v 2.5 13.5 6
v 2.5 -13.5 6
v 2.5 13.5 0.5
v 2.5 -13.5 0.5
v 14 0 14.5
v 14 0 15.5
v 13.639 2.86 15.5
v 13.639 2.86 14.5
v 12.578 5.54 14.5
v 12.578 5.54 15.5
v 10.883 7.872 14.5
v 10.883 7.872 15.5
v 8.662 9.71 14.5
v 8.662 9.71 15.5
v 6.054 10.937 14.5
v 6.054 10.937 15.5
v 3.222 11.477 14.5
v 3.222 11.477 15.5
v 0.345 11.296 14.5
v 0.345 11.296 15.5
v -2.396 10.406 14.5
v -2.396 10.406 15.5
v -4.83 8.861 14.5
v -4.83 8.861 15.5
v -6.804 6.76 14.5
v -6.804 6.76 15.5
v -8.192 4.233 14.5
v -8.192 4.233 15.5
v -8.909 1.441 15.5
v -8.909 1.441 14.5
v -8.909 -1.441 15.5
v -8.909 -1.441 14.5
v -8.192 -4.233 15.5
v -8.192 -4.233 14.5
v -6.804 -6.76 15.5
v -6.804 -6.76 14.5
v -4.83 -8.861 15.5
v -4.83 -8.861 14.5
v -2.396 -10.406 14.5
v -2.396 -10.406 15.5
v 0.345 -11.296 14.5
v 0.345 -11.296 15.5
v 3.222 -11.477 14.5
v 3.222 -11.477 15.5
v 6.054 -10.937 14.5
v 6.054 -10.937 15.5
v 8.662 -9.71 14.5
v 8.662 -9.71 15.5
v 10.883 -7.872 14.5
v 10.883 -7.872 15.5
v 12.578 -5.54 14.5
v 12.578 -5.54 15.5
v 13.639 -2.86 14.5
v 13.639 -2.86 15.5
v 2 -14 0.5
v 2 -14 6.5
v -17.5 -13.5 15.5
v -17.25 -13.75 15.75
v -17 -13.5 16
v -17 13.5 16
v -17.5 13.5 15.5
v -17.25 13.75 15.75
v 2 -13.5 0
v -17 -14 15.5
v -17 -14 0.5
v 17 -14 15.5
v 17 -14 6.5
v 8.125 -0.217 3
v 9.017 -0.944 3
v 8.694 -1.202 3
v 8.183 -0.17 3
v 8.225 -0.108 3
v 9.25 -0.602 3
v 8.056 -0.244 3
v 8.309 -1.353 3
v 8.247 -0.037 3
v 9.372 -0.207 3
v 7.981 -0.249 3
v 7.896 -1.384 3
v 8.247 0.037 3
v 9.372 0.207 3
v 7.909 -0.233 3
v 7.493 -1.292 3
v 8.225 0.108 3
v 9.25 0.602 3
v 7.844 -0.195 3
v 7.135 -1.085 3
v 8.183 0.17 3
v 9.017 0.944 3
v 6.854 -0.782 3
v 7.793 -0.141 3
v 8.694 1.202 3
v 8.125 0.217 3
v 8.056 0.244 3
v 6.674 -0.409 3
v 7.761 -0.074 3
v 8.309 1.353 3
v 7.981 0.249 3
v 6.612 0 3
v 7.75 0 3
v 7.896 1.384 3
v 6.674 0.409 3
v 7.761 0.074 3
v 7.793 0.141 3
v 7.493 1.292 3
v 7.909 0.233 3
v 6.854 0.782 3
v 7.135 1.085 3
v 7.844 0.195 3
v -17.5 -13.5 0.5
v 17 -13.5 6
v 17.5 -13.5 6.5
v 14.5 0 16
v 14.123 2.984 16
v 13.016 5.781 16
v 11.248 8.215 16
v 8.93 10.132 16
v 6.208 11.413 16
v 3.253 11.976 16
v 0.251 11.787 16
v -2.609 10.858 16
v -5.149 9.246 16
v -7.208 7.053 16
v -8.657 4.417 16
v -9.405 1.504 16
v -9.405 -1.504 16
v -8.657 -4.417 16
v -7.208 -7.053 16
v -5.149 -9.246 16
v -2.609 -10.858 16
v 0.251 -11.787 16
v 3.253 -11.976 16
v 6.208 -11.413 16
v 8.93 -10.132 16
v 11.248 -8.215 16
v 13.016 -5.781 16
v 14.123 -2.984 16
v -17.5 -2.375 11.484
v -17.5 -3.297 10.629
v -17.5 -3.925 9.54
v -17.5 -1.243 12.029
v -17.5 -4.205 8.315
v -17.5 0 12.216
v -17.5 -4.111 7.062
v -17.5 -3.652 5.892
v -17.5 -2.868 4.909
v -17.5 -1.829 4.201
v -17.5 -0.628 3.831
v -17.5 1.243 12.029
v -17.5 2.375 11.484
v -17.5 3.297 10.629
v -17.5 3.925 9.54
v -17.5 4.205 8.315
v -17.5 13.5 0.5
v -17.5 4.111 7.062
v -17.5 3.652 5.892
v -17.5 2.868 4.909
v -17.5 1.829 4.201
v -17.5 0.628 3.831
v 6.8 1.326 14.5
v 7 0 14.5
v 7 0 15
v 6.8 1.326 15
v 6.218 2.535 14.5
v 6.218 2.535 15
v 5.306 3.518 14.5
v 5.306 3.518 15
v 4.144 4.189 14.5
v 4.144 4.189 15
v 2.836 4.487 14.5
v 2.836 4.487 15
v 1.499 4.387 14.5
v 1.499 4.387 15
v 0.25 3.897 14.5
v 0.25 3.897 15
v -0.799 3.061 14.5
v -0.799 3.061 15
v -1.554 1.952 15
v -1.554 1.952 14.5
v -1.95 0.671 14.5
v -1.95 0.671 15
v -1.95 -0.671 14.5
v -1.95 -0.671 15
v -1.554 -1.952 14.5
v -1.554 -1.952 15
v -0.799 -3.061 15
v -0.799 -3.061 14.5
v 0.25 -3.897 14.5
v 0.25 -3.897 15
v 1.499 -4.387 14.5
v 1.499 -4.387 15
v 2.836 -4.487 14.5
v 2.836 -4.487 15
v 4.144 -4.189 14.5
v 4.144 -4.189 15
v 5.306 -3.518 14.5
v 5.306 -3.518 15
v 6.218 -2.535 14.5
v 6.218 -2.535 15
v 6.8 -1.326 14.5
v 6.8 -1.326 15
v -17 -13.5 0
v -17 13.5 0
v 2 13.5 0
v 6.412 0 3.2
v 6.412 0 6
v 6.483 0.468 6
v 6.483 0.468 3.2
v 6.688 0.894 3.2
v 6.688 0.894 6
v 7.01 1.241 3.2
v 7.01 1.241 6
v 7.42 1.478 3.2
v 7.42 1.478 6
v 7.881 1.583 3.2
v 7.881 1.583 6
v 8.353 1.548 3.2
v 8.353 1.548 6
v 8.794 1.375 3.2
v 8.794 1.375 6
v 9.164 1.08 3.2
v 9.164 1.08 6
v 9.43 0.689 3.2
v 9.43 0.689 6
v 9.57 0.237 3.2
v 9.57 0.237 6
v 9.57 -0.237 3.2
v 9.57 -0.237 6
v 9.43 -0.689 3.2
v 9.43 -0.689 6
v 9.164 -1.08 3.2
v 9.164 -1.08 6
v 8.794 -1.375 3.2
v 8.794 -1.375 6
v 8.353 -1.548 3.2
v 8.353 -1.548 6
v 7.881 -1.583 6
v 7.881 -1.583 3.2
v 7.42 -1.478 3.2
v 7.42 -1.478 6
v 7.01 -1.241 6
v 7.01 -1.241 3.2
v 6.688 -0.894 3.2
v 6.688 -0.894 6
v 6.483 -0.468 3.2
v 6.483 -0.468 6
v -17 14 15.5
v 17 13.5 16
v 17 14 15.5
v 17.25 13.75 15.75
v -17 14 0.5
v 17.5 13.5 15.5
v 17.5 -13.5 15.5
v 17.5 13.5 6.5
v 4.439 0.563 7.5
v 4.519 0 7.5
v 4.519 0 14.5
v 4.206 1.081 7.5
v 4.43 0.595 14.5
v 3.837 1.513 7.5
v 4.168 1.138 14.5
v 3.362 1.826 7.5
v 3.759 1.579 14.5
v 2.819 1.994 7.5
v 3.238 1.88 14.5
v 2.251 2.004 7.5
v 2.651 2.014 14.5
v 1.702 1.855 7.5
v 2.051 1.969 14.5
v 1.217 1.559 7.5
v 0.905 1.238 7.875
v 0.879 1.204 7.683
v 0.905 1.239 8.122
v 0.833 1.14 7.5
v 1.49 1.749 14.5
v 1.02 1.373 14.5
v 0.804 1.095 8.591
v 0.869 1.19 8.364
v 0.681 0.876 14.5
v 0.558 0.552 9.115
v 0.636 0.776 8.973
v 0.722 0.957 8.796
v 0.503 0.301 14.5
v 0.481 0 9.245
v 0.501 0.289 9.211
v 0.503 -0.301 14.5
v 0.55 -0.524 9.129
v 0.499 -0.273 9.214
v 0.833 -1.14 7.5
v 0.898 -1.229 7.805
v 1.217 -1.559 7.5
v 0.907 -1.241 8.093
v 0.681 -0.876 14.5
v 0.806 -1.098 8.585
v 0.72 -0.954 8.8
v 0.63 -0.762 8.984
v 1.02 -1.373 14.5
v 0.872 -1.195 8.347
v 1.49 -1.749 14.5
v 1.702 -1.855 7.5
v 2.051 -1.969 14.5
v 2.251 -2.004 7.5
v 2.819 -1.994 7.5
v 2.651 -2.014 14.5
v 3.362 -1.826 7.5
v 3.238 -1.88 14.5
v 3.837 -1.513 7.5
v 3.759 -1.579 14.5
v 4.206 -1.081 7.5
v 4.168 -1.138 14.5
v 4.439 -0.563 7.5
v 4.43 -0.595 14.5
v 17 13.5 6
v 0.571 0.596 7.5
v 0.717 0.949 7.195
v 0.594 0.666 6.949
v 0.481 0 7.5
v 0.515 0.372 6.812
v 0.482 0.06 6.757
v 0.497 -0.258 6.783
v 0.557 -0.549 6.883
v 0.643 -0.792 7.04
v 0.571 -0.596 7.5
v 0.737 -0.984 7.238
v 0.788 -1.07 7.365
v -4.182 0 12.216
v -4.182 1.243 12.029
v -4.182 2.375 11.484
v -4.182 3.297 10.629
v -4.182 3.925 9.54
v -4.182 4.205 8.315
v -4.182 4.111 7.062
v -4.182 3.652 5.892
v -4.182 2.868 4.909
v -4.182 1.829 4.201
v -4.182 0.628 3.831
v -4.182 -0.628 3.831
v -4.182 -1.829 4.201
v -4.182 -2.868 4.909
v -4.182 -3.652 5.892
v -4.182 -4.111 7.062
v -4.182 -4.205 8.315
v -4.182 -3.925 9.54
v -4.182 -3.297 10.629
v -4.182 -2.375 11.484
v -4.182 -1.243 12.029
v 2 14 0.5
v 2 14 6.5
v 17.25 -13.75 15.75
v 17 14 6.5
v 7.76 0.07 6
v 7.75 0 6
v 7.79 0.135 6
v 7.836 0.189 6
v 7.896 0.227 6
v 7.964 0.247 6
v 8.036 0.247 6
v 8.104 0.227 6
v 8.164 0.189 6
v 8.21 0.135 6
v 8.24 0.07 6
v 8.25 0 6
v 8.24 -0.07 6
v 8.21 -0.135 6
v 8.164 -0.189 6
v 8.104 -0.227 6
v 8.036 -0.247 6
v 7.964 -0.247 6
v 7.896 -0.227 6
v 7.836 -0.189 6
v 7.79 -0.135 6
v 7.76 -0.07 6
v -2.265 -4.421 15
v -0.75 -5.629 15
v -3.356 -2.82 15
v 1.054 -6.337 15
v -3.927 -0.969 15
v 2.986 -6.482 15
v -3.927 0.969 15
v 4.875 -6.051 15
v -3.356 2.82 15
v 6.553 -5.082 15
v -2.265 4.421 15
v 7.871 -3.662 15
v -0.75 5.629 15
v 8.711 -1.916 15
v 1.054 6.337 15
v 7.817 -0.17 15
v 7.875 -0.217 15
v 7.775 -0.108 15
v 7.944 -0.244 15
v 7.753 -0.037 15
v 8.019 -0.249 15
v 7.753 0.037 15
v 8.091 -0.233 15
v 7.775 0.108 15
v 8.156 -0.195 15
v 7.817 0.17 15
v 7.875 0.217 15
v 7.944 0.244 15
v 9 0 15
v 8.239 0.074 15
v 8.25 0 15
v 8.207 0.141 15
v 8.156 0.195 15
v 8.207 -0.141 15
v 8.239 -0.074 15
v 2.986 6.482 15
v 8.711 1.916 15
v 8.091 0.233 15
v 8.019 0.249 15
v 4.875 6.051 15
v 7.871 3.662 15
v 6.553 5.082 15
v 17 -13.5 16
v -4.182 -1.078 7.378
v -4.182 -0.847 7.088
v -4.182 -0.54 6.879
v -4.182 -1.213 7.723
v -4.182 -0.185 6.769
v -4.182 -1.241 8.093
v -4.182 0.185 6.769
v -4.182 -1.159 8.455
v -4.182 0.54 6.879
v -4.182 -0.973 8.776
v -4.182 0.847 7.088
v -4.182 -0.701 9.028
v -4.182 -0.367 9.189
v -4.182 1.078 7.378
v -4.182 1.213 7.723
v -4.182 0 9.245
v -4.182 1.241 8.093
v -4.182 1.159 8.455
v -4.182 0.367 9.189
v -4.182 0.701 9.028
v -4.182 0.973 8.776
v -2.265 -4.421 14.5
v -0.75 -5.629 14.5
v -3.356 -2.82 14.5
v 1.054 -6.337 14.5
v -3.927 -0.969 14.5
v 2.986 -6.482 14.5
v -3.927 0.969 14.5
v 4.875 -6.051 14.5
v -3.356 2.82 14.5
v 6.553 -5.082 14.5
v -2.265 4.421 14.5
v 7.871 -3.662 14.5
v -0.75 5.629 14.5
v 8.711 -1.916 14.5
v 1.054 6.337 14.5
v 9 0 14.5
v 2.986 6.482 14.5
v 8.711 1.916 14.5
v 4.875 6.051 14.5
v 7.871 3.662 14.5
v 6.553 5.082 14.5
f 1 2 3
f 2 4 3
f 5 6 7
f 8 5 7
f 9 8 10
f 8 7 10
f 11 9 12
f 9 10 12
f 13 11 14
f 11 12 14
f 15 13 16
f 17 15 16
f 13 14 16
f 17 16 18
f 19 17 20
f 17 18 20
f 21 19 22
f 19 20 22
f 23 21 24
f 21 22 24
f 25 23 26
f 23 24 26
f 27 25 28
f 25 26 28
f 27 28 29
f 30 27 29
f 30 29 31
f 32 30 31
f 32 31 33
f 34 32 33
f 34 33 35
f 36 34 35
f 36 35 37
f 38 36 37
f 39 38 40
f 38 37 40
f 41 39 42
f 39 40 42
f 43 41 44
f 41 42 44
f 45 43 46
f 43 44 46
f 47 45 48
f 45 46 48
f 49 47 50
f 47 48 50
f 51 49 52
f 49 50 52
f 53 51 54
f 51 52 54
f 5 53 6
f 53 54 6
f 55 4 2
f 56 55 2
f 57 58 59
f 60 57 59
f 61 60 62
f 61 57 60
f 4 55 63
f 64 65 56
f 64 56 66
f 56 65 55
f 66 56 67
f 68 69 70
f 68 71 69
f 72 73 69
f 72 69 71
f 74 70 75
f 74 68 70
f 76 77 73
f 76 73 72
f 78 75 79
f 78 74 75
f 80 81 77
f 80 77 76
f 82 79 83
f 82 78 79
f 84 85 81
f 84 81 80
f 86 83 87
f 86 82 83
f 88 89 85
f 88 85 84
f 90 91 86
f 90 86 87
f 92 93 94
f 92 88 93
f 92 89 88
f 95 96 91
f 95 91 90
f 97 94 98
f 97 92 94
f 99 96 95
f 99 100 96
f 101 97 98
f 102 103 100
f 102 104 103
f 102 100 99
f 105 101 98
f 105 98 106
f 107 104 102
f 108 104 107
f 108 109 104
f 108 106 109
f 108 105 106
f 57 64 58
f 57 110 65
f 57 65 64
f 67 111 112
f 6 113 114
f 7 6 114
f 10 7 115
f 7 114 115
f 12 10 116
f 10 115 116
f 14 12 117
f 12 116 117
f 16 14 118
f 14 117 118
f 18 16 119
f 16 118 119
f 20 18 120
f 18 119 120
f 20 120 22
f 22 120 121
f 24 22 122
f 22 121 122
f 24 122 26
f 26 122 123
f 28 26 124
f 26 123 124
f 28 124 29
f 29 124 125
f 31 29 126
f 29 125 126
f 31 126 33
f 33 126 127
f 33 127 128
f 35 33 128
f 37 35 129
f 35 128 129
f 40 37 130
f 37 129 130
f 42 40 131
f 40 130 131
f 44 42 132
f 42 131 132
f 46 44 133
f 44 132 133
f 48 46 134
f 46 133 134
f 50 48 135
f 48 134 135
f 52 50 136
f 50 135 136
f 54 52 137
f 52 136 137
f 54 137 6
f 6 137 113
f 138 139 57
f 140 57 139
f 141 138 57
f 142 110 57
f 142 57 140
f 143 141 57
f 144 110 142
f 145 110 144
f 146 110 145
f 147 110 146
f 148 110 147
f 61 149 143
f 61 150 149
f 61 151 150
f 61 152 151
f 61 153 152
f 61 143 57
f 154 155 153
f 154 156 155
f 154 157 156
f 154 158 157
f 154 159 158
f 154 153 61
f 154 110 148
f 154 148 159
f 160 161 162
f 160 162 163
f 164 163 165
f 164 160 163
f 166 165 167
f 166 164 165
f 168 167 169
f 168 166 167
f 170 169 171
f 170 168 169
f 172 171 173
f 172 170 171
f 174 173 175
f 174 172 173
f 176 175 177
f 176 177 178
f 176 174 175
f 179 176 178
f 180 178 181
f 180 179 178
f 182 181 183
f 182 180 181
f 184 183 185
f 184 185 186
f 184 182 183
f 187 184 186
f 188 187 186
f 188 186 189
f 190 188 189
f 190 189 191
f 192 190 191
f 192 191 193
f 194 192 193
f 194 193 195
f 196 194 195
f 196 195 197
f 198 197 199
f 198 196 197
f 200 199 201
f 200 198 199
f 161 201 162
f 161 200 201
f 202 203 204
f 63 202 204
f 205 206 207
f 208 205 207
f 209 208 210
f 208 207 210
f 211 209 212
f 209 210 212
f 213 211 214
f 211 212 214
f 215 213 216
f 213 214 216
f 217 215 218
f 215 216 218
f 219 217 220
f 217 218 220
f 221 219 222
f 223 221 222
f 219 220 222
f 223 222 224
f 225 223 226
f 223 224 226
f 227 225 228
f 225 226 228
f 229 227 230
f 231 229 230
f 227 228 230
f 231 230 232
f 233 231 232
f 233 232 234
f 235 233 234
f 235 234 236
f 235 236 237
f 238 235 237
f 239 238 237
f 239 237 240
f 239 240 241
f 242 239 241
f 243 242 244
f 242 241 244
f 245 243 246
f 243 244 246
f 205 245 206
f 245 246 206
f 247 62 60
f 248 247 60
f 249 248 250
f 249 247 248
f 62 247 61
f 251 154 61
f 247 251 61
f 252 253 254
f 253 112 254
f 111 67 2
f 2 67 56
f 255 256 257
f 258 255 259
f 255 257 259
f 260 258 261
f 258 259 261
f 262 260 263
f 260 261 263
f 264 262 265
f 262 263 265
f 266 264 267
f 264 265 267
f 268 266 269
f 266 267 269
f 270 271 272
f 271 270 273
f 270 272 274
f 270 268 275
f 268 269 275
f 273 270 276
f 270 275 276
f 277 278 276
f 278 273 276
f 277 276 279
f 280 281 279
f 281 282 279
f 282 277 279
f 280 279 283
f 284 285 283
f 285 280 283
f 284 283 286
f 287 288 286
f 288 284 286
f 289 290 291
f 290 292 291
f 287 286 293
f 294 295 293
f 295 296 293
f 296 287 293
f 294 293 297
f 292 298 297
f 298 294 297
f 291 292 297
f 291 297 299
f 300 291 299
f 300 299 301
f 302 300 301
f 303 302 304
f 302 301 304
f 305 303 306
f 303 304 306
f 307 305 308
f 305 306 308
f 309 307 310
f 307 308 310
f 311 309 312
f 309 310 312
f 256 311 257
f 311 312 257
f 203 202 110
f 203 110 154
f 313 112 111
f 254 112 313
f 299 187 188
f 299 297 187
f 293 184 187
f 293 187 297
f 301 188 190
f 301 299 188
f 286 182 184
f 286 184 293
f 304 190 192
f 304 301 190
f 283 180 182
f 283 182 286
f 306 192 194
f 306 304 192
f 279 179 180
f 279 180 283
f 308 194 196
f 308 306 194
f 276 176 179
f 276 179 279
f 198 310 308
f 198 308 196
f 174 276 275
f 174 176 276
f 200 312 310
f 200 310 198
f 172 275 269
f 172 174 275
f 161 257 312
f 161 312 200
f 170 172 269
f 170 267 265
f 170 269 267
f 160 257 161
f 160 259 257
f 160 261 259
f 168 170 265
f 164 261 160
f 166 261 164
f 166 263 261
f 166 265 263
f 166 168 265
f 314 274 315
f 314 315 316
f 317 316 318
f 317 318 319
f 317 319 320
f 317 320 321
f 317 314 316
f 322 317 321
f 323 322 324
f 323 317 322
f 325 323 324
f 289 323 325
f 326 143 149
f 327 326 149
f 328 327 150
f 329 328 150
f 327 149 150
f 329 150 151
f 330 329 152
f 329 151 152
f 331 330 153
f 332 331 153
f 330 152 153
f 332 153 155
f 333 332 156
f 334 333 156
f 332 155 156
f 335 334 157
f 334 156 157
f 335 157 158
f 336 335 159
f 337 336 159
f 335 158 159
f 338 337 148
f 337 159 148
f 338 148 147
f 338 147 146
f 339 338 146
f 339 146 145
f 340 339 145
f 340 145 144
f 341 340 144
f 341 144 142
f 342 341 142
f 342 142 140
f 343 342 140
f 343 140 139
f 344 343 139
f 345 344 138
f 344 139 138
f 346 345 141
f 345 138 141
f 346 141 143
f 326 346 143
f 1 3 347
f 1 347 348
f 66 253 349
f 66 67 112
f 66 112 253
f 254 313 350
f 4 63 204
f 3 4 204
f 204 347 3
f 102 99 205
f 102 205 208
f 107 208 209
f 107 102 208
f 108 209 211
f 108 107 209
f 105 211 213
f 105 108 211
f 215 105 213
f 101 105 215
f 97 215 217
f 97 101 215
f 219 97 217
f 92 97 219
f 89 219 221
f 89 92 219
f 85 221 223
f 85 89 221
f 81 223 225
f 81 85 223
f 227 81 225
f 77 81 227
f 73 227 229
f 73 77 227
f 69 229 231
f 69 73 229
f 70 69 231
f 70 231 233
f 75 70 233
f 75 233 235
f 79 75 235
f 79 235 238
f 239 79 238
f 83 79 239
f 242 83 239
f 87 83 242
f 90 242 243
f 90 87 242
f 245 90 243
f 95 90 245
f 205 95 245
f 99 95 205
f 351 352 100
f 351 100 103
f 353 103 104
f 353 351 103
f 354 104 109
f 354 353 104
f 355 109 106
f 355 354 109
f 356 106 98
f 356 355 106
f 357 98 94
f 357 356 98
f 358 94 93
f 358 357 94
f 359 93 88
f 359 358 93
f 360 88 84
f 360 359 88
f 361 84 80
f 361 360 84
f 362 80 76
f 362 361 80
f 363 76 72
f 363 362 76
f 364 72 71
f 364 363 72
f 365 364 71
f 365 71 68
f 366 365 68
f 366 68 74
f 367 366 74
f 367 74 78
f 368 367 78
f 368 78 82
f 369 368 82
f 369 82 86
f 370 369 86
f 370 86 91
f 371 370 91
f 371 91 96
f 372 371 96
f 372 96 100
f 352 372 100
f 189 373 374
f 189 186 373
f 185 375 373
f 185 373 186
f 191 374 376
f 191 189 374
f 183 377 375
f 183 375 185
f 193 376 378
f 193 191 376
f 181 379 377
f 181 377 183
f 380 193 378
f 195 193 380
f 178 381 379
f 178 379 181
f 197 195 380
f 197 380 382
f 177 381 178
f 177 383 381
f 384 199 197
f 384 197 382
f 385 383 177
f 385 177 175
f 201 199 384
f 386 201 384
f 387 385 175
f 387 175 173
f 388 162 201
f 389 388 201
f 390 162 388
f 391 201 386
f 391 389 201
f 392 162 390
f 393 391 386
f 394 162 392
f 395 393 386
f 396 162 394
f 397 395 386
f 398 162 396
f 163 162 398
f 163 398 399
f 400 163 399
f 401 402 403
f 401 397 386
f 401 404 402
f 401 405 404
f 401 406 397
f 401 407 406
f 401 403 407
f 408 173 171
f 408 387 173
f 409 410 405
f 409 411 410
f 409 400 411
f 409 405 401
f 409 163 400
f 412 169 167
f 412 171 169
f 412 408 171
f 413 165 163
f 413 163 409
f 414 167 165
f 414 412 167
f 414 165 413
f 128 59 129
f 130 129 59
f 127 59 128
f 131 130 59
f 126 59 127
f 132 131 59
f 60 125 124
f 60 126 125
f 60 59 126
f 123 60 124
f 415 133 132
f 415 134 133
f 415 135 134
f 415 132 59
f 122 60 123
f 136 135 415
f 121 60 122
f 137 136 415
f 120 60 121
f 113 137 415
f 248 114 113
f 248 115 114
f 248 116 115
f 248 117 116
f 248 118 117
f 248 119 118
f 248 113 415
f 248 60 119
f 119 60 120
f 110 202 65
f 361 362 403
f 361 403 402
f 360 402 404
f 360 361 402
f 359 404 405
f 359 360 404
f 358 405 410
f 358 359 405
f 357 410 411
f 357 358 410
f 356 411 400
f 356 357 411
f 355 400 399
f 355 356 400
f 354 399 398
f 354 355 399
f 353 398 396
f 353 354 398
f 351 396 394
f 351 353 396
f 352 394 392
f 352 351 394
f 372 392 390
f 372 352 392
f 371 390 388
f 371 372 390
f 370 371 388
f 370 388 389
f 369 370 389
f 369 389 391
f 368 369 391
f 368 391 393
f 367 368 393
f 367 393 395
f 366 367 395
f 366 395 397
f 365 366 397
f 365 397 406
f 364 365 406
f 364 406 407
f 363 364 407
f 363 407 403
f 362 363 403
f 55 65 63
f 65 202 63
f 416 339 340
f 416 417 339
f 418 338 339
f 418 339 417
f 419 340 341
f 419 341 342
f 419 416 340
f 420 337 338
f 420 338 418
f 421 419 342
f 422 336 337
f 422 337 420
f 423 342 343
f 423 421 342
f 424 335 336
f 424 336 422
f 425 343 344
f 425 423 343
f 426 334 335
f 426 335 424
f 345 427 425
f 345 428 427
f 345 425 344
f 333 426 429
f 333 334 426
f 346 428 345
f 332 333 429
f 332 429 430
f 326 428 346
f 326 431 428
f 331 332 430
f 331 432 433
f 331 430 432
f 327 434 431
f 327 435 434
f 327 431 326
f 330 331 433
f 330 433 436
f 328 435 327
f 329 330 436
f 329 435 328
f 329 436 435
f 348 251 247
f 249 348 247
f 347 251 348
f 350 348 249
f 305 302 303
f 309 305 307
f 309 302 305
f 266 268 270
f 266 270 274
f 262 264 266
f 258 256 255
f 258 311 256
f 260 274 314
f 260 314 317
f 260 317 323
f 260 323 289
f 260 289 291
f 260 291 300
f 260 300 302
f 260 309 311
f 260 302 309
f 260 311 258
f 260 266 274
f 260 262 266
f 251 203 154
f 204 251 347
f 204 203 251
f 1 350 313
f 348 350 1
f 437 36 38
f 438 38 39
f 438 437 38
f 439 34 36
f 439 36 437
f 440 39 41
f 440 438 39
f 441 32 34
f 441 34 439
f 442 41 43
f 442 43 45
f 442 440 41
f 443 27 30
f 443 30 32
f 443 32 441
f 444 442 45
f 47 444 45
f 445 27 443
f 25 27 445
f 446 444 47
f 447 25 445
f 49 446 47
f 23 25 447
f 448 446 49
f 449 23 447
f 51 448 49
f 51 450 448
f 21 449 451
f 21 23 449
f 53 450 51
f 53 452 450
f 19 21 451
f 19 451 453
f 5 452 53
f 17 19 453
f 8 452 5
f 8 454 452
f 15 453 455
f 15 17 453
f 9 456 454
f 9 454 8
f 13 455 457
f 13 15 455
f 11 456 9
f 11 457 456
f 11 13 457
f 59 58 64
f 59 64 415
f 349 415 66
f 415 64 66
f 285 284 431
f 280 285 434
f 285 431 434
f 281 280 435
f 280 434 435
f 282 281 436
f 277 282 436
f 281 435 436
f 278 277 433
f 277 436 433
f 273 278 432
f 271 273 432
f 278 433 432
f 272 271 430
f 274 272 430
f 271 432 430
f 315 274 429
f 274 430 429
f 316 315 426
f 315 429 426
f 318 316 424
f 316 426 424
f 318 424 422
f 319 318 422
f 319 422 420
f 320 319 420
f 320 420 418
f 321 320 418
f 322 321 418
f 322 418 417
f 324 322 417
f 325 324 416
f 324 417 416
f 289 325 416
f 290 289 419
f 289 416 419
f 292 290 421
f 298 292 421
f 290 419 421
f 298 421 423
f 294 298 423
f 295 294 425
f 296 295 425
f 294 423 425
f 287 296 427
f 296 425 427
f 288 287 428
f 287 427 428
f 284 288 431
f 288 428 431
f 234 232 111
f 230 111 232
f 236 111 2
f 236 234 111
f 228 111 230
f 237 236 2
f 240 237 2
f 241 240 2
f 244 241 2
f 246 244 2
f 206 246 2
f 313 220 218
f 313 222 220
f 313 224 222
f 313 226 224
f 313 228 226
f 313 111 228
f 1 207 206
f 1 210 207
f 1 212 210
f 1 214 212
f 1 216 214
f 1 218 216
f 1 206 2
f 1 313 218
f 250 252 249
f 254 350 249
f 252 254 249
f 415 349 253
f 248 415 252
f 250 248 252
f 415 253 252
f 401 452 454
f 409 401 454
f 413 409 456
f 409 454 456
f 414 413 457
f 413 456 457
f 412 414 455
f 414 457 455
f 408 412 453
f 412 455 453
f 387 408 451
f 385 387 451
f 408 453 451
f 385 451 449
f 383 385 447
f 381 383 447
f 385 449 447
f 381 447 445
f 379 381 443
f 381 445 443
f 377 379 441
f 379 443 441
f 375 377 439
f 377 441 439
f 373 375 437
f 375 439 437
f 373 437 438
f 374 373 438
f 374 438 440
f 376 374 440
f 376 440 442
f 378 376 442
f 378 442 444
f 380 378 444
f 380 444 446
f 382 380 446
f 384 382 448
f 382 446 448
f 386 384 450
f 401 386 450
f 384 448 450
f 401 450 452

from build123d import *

# Parameters (mm, degrees)
SKETCH1_W               = 35
SKETCH1_H               = 28
BOSS_EXTRUDE1_DEPTH     = 16
SKETCH2_R               = 11.5
CUT_EXTRUDE1_DEPTH      = 1.5
SKETCH3_R               = 2.0193
CUT_EXTRUDE2_DEPTH      = 7
SKETCH4_R               = 4.2164
CUT_EXTRUDE3_DEPTH      = 13.318
CUT_EXTRUDE4_REACH      = 32.366
CUT_EXTRUDE4_END_RADIUS = 2.0193
SKETCH5_R               = 1.2446
SKETCH6_R               = 6.5
SKETCH6_R_2             = 4.5
BOSS_EXTRUDE2_DEPTH     = 0.5
SKETCH7_R               = 0.5
CUT_EXTRUDE5_DEPTH      = 9
SKETCH15_W              = 15
SKETCH15_H              = 28
CUT_EXTRUDE9_DEPTH      = 6
SKETCH16_R              = 1.5875
SKETCH16_R_2            = 0.25
BOSS_EXTRUDE4_DEPTH     = 3
SKETCH17_R              = 0.515994608
SKETCH17_R_2            = 0.25
BOSS_EXTRUDE5_DEPTH     = 9
CHAMFER5_SIZE           = 0.5
CHAMFER6_SIZE           = 0.2
CHAMFER7_SIZE           = 0.5


with BuildPart() as part:
    # Sketch1 → Boss-Extrude1 (new body)
    with BuildSketch(Plane.XY):
        Rectangle(SKETCH1_W, SKETCH1_H)
    extrude(amount=BOSS_EXTRUDE1_DEPTH)

    # Sketch2 → Cut-Extrude1 (cut)
    with BuildSketch(Plane.XY.offset(16)):
        with Locations((2.5, 0)):
            Circle(SKETCH2_R)
    extrude(amount=-CUT_EXTRUDE1_DEPTH, mode=Mode.SUBTRACT)

    # Sketch3 → Cut-Extrude2 (cut)
    with BuildSketch(Plane.XY.offset(14.5)):
        with Locations((2.5, 0)):
            Circle(SKETCH3_R)
    extrude(amount=-CUT_EXTRUDE2_DEPTH, mode=Mode.SUBTRACT)

    # Sketch4 → Cut-Extrude3 (cut)
    with BuildSketch(Plane.ZY.offset(17.5)):
        with Locations((8, 0)):
            Circle(SKETCH4_R)
    extrude(amount=-CUT_EXTRUDE3_DEPTH, mode=Mode.SUBTRACT)

    # Cut-Extrude4: up to this cylinder (the profile starts outside it)
    cut_extrude4_end = Plane(origin=(2.5, 0, 8), z_dir=(0, 0, 1)) * Cylinder(CUT_EXTRUDE4_END_RADIUS, 69.7706, mode=Mode.PRIVATE)
    # Sketch5 → Cut-Extrude4 (cut, up to the surface)
    with BuildSketch(Plane.ZY.offset(4.182), mode=Mode.PRIVATE) as cut_extrude4_sk1:
        with Locations((8, 0)):
            Circle(SKETCH5_R)
    cut_extrude4_tool1 = extrude(cut_extrude4_sk1.sketch, amount=-CUT_EXTRUDE4_REACH, mode=Mode.PRIVATE) - cut_extrude4_end
    add(cut_extrude4_tool1.solids().sort_by_distance((-4.182, 0, 8))[0], mode=Mode.SUBTRACT)

    # Sketch6 → Boss-Extrude2 (add)
    with BuildSketch(Plane.XY.offset(14.5)):
        with Locations((2.5, 0)):
            Circle(SKETCH6_R)
        with Locations((2.5, 0)):
            Circle(SKETCH6_R_2, mode=Mode.SUBTRACT)
    extrude(amount=BOSS_EXTRUDE2_DEPTH)

    # Sketch7 → Cut-Extrude5 (cut)
    with BuildSketch(Plane.XY.offset(15)):
        with Locations((8, 0)):
            Circle(SKETCH7_R)
    extrude(amount=-CUT_EXTRUDE5_DEPTH, mode=Mode.SUBTRACT)

    # Sketch15 → Cut-Extrude9 (cut)
    with BuildSketch(Plane(origin=(0, 0, 0), x_dir=(-1, 0, 0), z_dir=(0, 0, -1))):
        with Locations((-10, 0)):
            Rectangle(SKETCH15_W, SKETCH15_H)
    extrude(amount=-CUT_EXTRUDE9_DEPTH, mode=Mode.SUBTRACT)

    # Sketch16 → Boss-Extrude4 (add)
    with BuildSketch(Plane(origin=(0, 0, 6), x_dir=(-1, 0, 0), z_dir=(0, 0, -1))):
        with Locations((-8, 0)):
            Circle(SKETCH16_R)
        with Locations((-8, 0)):
            Circle(SKETCH16_R_2, mode=Mode.SUBTRACT)
    extrude(amount=BOSS_EXTRUDE4_DEPTH)

    # Sketch17 → Boss-Extrude5 (add)
    with BuildSketch(Plane.XY.offset(6)):
        with Locations((8, 0)):
            Circle(SKETCH17_R)
        with Locations((8, 0)):
            Circle(SKETCH17_R_2, mode=Mode.SUBTRACT)
    extrude(amount=BOSS_EXTRUDE5_DEPTH)

    # Chamfer5
    chamfer5_edges = [part.edges().sort_by_distance(p)[0] for p in [
        (0, -14, 16),
        (-9, 0, 16),
        (17.5, 0, 16),
        (0, 14, 16),
        (-17.5, 0, 16),
    ]]
    chamfer(chamfer5_edges, length=CHAMFER5_SIZE)

    # Chamfer6
    chamfer6_edges = [part.edges().sort_by_distance(p)[0] for p in [
        (9.5875, 0, 3),
    ]]
    chamfer(chamfer6_edges, length=CHAMFER6_SIZE)

    # Chamfer7
    chamfer7_edges = [part.edges().sort_by_distance(p)[0] for p in [
        (-7.5, 14, 0),
        (-7.5, -14, 0),
        (10, -14, 6),
        (2.5, -14, 3),
        (17.5, 0, 6),
        (10, 14, 6),
        (2.5, 14, 3),
        (2.5, 0, 0),
        (-17.5, 0, 0),
        (17.5, 14, 10.75),
        (17.5, -14, 10.75),
        (-17.5, 14, 7.75),
        (-17.5, -14, 7.75),
    ]]
    chamfer(chamfer7_edges, length=CHAMFER7_SIZE)


solid = part.part
